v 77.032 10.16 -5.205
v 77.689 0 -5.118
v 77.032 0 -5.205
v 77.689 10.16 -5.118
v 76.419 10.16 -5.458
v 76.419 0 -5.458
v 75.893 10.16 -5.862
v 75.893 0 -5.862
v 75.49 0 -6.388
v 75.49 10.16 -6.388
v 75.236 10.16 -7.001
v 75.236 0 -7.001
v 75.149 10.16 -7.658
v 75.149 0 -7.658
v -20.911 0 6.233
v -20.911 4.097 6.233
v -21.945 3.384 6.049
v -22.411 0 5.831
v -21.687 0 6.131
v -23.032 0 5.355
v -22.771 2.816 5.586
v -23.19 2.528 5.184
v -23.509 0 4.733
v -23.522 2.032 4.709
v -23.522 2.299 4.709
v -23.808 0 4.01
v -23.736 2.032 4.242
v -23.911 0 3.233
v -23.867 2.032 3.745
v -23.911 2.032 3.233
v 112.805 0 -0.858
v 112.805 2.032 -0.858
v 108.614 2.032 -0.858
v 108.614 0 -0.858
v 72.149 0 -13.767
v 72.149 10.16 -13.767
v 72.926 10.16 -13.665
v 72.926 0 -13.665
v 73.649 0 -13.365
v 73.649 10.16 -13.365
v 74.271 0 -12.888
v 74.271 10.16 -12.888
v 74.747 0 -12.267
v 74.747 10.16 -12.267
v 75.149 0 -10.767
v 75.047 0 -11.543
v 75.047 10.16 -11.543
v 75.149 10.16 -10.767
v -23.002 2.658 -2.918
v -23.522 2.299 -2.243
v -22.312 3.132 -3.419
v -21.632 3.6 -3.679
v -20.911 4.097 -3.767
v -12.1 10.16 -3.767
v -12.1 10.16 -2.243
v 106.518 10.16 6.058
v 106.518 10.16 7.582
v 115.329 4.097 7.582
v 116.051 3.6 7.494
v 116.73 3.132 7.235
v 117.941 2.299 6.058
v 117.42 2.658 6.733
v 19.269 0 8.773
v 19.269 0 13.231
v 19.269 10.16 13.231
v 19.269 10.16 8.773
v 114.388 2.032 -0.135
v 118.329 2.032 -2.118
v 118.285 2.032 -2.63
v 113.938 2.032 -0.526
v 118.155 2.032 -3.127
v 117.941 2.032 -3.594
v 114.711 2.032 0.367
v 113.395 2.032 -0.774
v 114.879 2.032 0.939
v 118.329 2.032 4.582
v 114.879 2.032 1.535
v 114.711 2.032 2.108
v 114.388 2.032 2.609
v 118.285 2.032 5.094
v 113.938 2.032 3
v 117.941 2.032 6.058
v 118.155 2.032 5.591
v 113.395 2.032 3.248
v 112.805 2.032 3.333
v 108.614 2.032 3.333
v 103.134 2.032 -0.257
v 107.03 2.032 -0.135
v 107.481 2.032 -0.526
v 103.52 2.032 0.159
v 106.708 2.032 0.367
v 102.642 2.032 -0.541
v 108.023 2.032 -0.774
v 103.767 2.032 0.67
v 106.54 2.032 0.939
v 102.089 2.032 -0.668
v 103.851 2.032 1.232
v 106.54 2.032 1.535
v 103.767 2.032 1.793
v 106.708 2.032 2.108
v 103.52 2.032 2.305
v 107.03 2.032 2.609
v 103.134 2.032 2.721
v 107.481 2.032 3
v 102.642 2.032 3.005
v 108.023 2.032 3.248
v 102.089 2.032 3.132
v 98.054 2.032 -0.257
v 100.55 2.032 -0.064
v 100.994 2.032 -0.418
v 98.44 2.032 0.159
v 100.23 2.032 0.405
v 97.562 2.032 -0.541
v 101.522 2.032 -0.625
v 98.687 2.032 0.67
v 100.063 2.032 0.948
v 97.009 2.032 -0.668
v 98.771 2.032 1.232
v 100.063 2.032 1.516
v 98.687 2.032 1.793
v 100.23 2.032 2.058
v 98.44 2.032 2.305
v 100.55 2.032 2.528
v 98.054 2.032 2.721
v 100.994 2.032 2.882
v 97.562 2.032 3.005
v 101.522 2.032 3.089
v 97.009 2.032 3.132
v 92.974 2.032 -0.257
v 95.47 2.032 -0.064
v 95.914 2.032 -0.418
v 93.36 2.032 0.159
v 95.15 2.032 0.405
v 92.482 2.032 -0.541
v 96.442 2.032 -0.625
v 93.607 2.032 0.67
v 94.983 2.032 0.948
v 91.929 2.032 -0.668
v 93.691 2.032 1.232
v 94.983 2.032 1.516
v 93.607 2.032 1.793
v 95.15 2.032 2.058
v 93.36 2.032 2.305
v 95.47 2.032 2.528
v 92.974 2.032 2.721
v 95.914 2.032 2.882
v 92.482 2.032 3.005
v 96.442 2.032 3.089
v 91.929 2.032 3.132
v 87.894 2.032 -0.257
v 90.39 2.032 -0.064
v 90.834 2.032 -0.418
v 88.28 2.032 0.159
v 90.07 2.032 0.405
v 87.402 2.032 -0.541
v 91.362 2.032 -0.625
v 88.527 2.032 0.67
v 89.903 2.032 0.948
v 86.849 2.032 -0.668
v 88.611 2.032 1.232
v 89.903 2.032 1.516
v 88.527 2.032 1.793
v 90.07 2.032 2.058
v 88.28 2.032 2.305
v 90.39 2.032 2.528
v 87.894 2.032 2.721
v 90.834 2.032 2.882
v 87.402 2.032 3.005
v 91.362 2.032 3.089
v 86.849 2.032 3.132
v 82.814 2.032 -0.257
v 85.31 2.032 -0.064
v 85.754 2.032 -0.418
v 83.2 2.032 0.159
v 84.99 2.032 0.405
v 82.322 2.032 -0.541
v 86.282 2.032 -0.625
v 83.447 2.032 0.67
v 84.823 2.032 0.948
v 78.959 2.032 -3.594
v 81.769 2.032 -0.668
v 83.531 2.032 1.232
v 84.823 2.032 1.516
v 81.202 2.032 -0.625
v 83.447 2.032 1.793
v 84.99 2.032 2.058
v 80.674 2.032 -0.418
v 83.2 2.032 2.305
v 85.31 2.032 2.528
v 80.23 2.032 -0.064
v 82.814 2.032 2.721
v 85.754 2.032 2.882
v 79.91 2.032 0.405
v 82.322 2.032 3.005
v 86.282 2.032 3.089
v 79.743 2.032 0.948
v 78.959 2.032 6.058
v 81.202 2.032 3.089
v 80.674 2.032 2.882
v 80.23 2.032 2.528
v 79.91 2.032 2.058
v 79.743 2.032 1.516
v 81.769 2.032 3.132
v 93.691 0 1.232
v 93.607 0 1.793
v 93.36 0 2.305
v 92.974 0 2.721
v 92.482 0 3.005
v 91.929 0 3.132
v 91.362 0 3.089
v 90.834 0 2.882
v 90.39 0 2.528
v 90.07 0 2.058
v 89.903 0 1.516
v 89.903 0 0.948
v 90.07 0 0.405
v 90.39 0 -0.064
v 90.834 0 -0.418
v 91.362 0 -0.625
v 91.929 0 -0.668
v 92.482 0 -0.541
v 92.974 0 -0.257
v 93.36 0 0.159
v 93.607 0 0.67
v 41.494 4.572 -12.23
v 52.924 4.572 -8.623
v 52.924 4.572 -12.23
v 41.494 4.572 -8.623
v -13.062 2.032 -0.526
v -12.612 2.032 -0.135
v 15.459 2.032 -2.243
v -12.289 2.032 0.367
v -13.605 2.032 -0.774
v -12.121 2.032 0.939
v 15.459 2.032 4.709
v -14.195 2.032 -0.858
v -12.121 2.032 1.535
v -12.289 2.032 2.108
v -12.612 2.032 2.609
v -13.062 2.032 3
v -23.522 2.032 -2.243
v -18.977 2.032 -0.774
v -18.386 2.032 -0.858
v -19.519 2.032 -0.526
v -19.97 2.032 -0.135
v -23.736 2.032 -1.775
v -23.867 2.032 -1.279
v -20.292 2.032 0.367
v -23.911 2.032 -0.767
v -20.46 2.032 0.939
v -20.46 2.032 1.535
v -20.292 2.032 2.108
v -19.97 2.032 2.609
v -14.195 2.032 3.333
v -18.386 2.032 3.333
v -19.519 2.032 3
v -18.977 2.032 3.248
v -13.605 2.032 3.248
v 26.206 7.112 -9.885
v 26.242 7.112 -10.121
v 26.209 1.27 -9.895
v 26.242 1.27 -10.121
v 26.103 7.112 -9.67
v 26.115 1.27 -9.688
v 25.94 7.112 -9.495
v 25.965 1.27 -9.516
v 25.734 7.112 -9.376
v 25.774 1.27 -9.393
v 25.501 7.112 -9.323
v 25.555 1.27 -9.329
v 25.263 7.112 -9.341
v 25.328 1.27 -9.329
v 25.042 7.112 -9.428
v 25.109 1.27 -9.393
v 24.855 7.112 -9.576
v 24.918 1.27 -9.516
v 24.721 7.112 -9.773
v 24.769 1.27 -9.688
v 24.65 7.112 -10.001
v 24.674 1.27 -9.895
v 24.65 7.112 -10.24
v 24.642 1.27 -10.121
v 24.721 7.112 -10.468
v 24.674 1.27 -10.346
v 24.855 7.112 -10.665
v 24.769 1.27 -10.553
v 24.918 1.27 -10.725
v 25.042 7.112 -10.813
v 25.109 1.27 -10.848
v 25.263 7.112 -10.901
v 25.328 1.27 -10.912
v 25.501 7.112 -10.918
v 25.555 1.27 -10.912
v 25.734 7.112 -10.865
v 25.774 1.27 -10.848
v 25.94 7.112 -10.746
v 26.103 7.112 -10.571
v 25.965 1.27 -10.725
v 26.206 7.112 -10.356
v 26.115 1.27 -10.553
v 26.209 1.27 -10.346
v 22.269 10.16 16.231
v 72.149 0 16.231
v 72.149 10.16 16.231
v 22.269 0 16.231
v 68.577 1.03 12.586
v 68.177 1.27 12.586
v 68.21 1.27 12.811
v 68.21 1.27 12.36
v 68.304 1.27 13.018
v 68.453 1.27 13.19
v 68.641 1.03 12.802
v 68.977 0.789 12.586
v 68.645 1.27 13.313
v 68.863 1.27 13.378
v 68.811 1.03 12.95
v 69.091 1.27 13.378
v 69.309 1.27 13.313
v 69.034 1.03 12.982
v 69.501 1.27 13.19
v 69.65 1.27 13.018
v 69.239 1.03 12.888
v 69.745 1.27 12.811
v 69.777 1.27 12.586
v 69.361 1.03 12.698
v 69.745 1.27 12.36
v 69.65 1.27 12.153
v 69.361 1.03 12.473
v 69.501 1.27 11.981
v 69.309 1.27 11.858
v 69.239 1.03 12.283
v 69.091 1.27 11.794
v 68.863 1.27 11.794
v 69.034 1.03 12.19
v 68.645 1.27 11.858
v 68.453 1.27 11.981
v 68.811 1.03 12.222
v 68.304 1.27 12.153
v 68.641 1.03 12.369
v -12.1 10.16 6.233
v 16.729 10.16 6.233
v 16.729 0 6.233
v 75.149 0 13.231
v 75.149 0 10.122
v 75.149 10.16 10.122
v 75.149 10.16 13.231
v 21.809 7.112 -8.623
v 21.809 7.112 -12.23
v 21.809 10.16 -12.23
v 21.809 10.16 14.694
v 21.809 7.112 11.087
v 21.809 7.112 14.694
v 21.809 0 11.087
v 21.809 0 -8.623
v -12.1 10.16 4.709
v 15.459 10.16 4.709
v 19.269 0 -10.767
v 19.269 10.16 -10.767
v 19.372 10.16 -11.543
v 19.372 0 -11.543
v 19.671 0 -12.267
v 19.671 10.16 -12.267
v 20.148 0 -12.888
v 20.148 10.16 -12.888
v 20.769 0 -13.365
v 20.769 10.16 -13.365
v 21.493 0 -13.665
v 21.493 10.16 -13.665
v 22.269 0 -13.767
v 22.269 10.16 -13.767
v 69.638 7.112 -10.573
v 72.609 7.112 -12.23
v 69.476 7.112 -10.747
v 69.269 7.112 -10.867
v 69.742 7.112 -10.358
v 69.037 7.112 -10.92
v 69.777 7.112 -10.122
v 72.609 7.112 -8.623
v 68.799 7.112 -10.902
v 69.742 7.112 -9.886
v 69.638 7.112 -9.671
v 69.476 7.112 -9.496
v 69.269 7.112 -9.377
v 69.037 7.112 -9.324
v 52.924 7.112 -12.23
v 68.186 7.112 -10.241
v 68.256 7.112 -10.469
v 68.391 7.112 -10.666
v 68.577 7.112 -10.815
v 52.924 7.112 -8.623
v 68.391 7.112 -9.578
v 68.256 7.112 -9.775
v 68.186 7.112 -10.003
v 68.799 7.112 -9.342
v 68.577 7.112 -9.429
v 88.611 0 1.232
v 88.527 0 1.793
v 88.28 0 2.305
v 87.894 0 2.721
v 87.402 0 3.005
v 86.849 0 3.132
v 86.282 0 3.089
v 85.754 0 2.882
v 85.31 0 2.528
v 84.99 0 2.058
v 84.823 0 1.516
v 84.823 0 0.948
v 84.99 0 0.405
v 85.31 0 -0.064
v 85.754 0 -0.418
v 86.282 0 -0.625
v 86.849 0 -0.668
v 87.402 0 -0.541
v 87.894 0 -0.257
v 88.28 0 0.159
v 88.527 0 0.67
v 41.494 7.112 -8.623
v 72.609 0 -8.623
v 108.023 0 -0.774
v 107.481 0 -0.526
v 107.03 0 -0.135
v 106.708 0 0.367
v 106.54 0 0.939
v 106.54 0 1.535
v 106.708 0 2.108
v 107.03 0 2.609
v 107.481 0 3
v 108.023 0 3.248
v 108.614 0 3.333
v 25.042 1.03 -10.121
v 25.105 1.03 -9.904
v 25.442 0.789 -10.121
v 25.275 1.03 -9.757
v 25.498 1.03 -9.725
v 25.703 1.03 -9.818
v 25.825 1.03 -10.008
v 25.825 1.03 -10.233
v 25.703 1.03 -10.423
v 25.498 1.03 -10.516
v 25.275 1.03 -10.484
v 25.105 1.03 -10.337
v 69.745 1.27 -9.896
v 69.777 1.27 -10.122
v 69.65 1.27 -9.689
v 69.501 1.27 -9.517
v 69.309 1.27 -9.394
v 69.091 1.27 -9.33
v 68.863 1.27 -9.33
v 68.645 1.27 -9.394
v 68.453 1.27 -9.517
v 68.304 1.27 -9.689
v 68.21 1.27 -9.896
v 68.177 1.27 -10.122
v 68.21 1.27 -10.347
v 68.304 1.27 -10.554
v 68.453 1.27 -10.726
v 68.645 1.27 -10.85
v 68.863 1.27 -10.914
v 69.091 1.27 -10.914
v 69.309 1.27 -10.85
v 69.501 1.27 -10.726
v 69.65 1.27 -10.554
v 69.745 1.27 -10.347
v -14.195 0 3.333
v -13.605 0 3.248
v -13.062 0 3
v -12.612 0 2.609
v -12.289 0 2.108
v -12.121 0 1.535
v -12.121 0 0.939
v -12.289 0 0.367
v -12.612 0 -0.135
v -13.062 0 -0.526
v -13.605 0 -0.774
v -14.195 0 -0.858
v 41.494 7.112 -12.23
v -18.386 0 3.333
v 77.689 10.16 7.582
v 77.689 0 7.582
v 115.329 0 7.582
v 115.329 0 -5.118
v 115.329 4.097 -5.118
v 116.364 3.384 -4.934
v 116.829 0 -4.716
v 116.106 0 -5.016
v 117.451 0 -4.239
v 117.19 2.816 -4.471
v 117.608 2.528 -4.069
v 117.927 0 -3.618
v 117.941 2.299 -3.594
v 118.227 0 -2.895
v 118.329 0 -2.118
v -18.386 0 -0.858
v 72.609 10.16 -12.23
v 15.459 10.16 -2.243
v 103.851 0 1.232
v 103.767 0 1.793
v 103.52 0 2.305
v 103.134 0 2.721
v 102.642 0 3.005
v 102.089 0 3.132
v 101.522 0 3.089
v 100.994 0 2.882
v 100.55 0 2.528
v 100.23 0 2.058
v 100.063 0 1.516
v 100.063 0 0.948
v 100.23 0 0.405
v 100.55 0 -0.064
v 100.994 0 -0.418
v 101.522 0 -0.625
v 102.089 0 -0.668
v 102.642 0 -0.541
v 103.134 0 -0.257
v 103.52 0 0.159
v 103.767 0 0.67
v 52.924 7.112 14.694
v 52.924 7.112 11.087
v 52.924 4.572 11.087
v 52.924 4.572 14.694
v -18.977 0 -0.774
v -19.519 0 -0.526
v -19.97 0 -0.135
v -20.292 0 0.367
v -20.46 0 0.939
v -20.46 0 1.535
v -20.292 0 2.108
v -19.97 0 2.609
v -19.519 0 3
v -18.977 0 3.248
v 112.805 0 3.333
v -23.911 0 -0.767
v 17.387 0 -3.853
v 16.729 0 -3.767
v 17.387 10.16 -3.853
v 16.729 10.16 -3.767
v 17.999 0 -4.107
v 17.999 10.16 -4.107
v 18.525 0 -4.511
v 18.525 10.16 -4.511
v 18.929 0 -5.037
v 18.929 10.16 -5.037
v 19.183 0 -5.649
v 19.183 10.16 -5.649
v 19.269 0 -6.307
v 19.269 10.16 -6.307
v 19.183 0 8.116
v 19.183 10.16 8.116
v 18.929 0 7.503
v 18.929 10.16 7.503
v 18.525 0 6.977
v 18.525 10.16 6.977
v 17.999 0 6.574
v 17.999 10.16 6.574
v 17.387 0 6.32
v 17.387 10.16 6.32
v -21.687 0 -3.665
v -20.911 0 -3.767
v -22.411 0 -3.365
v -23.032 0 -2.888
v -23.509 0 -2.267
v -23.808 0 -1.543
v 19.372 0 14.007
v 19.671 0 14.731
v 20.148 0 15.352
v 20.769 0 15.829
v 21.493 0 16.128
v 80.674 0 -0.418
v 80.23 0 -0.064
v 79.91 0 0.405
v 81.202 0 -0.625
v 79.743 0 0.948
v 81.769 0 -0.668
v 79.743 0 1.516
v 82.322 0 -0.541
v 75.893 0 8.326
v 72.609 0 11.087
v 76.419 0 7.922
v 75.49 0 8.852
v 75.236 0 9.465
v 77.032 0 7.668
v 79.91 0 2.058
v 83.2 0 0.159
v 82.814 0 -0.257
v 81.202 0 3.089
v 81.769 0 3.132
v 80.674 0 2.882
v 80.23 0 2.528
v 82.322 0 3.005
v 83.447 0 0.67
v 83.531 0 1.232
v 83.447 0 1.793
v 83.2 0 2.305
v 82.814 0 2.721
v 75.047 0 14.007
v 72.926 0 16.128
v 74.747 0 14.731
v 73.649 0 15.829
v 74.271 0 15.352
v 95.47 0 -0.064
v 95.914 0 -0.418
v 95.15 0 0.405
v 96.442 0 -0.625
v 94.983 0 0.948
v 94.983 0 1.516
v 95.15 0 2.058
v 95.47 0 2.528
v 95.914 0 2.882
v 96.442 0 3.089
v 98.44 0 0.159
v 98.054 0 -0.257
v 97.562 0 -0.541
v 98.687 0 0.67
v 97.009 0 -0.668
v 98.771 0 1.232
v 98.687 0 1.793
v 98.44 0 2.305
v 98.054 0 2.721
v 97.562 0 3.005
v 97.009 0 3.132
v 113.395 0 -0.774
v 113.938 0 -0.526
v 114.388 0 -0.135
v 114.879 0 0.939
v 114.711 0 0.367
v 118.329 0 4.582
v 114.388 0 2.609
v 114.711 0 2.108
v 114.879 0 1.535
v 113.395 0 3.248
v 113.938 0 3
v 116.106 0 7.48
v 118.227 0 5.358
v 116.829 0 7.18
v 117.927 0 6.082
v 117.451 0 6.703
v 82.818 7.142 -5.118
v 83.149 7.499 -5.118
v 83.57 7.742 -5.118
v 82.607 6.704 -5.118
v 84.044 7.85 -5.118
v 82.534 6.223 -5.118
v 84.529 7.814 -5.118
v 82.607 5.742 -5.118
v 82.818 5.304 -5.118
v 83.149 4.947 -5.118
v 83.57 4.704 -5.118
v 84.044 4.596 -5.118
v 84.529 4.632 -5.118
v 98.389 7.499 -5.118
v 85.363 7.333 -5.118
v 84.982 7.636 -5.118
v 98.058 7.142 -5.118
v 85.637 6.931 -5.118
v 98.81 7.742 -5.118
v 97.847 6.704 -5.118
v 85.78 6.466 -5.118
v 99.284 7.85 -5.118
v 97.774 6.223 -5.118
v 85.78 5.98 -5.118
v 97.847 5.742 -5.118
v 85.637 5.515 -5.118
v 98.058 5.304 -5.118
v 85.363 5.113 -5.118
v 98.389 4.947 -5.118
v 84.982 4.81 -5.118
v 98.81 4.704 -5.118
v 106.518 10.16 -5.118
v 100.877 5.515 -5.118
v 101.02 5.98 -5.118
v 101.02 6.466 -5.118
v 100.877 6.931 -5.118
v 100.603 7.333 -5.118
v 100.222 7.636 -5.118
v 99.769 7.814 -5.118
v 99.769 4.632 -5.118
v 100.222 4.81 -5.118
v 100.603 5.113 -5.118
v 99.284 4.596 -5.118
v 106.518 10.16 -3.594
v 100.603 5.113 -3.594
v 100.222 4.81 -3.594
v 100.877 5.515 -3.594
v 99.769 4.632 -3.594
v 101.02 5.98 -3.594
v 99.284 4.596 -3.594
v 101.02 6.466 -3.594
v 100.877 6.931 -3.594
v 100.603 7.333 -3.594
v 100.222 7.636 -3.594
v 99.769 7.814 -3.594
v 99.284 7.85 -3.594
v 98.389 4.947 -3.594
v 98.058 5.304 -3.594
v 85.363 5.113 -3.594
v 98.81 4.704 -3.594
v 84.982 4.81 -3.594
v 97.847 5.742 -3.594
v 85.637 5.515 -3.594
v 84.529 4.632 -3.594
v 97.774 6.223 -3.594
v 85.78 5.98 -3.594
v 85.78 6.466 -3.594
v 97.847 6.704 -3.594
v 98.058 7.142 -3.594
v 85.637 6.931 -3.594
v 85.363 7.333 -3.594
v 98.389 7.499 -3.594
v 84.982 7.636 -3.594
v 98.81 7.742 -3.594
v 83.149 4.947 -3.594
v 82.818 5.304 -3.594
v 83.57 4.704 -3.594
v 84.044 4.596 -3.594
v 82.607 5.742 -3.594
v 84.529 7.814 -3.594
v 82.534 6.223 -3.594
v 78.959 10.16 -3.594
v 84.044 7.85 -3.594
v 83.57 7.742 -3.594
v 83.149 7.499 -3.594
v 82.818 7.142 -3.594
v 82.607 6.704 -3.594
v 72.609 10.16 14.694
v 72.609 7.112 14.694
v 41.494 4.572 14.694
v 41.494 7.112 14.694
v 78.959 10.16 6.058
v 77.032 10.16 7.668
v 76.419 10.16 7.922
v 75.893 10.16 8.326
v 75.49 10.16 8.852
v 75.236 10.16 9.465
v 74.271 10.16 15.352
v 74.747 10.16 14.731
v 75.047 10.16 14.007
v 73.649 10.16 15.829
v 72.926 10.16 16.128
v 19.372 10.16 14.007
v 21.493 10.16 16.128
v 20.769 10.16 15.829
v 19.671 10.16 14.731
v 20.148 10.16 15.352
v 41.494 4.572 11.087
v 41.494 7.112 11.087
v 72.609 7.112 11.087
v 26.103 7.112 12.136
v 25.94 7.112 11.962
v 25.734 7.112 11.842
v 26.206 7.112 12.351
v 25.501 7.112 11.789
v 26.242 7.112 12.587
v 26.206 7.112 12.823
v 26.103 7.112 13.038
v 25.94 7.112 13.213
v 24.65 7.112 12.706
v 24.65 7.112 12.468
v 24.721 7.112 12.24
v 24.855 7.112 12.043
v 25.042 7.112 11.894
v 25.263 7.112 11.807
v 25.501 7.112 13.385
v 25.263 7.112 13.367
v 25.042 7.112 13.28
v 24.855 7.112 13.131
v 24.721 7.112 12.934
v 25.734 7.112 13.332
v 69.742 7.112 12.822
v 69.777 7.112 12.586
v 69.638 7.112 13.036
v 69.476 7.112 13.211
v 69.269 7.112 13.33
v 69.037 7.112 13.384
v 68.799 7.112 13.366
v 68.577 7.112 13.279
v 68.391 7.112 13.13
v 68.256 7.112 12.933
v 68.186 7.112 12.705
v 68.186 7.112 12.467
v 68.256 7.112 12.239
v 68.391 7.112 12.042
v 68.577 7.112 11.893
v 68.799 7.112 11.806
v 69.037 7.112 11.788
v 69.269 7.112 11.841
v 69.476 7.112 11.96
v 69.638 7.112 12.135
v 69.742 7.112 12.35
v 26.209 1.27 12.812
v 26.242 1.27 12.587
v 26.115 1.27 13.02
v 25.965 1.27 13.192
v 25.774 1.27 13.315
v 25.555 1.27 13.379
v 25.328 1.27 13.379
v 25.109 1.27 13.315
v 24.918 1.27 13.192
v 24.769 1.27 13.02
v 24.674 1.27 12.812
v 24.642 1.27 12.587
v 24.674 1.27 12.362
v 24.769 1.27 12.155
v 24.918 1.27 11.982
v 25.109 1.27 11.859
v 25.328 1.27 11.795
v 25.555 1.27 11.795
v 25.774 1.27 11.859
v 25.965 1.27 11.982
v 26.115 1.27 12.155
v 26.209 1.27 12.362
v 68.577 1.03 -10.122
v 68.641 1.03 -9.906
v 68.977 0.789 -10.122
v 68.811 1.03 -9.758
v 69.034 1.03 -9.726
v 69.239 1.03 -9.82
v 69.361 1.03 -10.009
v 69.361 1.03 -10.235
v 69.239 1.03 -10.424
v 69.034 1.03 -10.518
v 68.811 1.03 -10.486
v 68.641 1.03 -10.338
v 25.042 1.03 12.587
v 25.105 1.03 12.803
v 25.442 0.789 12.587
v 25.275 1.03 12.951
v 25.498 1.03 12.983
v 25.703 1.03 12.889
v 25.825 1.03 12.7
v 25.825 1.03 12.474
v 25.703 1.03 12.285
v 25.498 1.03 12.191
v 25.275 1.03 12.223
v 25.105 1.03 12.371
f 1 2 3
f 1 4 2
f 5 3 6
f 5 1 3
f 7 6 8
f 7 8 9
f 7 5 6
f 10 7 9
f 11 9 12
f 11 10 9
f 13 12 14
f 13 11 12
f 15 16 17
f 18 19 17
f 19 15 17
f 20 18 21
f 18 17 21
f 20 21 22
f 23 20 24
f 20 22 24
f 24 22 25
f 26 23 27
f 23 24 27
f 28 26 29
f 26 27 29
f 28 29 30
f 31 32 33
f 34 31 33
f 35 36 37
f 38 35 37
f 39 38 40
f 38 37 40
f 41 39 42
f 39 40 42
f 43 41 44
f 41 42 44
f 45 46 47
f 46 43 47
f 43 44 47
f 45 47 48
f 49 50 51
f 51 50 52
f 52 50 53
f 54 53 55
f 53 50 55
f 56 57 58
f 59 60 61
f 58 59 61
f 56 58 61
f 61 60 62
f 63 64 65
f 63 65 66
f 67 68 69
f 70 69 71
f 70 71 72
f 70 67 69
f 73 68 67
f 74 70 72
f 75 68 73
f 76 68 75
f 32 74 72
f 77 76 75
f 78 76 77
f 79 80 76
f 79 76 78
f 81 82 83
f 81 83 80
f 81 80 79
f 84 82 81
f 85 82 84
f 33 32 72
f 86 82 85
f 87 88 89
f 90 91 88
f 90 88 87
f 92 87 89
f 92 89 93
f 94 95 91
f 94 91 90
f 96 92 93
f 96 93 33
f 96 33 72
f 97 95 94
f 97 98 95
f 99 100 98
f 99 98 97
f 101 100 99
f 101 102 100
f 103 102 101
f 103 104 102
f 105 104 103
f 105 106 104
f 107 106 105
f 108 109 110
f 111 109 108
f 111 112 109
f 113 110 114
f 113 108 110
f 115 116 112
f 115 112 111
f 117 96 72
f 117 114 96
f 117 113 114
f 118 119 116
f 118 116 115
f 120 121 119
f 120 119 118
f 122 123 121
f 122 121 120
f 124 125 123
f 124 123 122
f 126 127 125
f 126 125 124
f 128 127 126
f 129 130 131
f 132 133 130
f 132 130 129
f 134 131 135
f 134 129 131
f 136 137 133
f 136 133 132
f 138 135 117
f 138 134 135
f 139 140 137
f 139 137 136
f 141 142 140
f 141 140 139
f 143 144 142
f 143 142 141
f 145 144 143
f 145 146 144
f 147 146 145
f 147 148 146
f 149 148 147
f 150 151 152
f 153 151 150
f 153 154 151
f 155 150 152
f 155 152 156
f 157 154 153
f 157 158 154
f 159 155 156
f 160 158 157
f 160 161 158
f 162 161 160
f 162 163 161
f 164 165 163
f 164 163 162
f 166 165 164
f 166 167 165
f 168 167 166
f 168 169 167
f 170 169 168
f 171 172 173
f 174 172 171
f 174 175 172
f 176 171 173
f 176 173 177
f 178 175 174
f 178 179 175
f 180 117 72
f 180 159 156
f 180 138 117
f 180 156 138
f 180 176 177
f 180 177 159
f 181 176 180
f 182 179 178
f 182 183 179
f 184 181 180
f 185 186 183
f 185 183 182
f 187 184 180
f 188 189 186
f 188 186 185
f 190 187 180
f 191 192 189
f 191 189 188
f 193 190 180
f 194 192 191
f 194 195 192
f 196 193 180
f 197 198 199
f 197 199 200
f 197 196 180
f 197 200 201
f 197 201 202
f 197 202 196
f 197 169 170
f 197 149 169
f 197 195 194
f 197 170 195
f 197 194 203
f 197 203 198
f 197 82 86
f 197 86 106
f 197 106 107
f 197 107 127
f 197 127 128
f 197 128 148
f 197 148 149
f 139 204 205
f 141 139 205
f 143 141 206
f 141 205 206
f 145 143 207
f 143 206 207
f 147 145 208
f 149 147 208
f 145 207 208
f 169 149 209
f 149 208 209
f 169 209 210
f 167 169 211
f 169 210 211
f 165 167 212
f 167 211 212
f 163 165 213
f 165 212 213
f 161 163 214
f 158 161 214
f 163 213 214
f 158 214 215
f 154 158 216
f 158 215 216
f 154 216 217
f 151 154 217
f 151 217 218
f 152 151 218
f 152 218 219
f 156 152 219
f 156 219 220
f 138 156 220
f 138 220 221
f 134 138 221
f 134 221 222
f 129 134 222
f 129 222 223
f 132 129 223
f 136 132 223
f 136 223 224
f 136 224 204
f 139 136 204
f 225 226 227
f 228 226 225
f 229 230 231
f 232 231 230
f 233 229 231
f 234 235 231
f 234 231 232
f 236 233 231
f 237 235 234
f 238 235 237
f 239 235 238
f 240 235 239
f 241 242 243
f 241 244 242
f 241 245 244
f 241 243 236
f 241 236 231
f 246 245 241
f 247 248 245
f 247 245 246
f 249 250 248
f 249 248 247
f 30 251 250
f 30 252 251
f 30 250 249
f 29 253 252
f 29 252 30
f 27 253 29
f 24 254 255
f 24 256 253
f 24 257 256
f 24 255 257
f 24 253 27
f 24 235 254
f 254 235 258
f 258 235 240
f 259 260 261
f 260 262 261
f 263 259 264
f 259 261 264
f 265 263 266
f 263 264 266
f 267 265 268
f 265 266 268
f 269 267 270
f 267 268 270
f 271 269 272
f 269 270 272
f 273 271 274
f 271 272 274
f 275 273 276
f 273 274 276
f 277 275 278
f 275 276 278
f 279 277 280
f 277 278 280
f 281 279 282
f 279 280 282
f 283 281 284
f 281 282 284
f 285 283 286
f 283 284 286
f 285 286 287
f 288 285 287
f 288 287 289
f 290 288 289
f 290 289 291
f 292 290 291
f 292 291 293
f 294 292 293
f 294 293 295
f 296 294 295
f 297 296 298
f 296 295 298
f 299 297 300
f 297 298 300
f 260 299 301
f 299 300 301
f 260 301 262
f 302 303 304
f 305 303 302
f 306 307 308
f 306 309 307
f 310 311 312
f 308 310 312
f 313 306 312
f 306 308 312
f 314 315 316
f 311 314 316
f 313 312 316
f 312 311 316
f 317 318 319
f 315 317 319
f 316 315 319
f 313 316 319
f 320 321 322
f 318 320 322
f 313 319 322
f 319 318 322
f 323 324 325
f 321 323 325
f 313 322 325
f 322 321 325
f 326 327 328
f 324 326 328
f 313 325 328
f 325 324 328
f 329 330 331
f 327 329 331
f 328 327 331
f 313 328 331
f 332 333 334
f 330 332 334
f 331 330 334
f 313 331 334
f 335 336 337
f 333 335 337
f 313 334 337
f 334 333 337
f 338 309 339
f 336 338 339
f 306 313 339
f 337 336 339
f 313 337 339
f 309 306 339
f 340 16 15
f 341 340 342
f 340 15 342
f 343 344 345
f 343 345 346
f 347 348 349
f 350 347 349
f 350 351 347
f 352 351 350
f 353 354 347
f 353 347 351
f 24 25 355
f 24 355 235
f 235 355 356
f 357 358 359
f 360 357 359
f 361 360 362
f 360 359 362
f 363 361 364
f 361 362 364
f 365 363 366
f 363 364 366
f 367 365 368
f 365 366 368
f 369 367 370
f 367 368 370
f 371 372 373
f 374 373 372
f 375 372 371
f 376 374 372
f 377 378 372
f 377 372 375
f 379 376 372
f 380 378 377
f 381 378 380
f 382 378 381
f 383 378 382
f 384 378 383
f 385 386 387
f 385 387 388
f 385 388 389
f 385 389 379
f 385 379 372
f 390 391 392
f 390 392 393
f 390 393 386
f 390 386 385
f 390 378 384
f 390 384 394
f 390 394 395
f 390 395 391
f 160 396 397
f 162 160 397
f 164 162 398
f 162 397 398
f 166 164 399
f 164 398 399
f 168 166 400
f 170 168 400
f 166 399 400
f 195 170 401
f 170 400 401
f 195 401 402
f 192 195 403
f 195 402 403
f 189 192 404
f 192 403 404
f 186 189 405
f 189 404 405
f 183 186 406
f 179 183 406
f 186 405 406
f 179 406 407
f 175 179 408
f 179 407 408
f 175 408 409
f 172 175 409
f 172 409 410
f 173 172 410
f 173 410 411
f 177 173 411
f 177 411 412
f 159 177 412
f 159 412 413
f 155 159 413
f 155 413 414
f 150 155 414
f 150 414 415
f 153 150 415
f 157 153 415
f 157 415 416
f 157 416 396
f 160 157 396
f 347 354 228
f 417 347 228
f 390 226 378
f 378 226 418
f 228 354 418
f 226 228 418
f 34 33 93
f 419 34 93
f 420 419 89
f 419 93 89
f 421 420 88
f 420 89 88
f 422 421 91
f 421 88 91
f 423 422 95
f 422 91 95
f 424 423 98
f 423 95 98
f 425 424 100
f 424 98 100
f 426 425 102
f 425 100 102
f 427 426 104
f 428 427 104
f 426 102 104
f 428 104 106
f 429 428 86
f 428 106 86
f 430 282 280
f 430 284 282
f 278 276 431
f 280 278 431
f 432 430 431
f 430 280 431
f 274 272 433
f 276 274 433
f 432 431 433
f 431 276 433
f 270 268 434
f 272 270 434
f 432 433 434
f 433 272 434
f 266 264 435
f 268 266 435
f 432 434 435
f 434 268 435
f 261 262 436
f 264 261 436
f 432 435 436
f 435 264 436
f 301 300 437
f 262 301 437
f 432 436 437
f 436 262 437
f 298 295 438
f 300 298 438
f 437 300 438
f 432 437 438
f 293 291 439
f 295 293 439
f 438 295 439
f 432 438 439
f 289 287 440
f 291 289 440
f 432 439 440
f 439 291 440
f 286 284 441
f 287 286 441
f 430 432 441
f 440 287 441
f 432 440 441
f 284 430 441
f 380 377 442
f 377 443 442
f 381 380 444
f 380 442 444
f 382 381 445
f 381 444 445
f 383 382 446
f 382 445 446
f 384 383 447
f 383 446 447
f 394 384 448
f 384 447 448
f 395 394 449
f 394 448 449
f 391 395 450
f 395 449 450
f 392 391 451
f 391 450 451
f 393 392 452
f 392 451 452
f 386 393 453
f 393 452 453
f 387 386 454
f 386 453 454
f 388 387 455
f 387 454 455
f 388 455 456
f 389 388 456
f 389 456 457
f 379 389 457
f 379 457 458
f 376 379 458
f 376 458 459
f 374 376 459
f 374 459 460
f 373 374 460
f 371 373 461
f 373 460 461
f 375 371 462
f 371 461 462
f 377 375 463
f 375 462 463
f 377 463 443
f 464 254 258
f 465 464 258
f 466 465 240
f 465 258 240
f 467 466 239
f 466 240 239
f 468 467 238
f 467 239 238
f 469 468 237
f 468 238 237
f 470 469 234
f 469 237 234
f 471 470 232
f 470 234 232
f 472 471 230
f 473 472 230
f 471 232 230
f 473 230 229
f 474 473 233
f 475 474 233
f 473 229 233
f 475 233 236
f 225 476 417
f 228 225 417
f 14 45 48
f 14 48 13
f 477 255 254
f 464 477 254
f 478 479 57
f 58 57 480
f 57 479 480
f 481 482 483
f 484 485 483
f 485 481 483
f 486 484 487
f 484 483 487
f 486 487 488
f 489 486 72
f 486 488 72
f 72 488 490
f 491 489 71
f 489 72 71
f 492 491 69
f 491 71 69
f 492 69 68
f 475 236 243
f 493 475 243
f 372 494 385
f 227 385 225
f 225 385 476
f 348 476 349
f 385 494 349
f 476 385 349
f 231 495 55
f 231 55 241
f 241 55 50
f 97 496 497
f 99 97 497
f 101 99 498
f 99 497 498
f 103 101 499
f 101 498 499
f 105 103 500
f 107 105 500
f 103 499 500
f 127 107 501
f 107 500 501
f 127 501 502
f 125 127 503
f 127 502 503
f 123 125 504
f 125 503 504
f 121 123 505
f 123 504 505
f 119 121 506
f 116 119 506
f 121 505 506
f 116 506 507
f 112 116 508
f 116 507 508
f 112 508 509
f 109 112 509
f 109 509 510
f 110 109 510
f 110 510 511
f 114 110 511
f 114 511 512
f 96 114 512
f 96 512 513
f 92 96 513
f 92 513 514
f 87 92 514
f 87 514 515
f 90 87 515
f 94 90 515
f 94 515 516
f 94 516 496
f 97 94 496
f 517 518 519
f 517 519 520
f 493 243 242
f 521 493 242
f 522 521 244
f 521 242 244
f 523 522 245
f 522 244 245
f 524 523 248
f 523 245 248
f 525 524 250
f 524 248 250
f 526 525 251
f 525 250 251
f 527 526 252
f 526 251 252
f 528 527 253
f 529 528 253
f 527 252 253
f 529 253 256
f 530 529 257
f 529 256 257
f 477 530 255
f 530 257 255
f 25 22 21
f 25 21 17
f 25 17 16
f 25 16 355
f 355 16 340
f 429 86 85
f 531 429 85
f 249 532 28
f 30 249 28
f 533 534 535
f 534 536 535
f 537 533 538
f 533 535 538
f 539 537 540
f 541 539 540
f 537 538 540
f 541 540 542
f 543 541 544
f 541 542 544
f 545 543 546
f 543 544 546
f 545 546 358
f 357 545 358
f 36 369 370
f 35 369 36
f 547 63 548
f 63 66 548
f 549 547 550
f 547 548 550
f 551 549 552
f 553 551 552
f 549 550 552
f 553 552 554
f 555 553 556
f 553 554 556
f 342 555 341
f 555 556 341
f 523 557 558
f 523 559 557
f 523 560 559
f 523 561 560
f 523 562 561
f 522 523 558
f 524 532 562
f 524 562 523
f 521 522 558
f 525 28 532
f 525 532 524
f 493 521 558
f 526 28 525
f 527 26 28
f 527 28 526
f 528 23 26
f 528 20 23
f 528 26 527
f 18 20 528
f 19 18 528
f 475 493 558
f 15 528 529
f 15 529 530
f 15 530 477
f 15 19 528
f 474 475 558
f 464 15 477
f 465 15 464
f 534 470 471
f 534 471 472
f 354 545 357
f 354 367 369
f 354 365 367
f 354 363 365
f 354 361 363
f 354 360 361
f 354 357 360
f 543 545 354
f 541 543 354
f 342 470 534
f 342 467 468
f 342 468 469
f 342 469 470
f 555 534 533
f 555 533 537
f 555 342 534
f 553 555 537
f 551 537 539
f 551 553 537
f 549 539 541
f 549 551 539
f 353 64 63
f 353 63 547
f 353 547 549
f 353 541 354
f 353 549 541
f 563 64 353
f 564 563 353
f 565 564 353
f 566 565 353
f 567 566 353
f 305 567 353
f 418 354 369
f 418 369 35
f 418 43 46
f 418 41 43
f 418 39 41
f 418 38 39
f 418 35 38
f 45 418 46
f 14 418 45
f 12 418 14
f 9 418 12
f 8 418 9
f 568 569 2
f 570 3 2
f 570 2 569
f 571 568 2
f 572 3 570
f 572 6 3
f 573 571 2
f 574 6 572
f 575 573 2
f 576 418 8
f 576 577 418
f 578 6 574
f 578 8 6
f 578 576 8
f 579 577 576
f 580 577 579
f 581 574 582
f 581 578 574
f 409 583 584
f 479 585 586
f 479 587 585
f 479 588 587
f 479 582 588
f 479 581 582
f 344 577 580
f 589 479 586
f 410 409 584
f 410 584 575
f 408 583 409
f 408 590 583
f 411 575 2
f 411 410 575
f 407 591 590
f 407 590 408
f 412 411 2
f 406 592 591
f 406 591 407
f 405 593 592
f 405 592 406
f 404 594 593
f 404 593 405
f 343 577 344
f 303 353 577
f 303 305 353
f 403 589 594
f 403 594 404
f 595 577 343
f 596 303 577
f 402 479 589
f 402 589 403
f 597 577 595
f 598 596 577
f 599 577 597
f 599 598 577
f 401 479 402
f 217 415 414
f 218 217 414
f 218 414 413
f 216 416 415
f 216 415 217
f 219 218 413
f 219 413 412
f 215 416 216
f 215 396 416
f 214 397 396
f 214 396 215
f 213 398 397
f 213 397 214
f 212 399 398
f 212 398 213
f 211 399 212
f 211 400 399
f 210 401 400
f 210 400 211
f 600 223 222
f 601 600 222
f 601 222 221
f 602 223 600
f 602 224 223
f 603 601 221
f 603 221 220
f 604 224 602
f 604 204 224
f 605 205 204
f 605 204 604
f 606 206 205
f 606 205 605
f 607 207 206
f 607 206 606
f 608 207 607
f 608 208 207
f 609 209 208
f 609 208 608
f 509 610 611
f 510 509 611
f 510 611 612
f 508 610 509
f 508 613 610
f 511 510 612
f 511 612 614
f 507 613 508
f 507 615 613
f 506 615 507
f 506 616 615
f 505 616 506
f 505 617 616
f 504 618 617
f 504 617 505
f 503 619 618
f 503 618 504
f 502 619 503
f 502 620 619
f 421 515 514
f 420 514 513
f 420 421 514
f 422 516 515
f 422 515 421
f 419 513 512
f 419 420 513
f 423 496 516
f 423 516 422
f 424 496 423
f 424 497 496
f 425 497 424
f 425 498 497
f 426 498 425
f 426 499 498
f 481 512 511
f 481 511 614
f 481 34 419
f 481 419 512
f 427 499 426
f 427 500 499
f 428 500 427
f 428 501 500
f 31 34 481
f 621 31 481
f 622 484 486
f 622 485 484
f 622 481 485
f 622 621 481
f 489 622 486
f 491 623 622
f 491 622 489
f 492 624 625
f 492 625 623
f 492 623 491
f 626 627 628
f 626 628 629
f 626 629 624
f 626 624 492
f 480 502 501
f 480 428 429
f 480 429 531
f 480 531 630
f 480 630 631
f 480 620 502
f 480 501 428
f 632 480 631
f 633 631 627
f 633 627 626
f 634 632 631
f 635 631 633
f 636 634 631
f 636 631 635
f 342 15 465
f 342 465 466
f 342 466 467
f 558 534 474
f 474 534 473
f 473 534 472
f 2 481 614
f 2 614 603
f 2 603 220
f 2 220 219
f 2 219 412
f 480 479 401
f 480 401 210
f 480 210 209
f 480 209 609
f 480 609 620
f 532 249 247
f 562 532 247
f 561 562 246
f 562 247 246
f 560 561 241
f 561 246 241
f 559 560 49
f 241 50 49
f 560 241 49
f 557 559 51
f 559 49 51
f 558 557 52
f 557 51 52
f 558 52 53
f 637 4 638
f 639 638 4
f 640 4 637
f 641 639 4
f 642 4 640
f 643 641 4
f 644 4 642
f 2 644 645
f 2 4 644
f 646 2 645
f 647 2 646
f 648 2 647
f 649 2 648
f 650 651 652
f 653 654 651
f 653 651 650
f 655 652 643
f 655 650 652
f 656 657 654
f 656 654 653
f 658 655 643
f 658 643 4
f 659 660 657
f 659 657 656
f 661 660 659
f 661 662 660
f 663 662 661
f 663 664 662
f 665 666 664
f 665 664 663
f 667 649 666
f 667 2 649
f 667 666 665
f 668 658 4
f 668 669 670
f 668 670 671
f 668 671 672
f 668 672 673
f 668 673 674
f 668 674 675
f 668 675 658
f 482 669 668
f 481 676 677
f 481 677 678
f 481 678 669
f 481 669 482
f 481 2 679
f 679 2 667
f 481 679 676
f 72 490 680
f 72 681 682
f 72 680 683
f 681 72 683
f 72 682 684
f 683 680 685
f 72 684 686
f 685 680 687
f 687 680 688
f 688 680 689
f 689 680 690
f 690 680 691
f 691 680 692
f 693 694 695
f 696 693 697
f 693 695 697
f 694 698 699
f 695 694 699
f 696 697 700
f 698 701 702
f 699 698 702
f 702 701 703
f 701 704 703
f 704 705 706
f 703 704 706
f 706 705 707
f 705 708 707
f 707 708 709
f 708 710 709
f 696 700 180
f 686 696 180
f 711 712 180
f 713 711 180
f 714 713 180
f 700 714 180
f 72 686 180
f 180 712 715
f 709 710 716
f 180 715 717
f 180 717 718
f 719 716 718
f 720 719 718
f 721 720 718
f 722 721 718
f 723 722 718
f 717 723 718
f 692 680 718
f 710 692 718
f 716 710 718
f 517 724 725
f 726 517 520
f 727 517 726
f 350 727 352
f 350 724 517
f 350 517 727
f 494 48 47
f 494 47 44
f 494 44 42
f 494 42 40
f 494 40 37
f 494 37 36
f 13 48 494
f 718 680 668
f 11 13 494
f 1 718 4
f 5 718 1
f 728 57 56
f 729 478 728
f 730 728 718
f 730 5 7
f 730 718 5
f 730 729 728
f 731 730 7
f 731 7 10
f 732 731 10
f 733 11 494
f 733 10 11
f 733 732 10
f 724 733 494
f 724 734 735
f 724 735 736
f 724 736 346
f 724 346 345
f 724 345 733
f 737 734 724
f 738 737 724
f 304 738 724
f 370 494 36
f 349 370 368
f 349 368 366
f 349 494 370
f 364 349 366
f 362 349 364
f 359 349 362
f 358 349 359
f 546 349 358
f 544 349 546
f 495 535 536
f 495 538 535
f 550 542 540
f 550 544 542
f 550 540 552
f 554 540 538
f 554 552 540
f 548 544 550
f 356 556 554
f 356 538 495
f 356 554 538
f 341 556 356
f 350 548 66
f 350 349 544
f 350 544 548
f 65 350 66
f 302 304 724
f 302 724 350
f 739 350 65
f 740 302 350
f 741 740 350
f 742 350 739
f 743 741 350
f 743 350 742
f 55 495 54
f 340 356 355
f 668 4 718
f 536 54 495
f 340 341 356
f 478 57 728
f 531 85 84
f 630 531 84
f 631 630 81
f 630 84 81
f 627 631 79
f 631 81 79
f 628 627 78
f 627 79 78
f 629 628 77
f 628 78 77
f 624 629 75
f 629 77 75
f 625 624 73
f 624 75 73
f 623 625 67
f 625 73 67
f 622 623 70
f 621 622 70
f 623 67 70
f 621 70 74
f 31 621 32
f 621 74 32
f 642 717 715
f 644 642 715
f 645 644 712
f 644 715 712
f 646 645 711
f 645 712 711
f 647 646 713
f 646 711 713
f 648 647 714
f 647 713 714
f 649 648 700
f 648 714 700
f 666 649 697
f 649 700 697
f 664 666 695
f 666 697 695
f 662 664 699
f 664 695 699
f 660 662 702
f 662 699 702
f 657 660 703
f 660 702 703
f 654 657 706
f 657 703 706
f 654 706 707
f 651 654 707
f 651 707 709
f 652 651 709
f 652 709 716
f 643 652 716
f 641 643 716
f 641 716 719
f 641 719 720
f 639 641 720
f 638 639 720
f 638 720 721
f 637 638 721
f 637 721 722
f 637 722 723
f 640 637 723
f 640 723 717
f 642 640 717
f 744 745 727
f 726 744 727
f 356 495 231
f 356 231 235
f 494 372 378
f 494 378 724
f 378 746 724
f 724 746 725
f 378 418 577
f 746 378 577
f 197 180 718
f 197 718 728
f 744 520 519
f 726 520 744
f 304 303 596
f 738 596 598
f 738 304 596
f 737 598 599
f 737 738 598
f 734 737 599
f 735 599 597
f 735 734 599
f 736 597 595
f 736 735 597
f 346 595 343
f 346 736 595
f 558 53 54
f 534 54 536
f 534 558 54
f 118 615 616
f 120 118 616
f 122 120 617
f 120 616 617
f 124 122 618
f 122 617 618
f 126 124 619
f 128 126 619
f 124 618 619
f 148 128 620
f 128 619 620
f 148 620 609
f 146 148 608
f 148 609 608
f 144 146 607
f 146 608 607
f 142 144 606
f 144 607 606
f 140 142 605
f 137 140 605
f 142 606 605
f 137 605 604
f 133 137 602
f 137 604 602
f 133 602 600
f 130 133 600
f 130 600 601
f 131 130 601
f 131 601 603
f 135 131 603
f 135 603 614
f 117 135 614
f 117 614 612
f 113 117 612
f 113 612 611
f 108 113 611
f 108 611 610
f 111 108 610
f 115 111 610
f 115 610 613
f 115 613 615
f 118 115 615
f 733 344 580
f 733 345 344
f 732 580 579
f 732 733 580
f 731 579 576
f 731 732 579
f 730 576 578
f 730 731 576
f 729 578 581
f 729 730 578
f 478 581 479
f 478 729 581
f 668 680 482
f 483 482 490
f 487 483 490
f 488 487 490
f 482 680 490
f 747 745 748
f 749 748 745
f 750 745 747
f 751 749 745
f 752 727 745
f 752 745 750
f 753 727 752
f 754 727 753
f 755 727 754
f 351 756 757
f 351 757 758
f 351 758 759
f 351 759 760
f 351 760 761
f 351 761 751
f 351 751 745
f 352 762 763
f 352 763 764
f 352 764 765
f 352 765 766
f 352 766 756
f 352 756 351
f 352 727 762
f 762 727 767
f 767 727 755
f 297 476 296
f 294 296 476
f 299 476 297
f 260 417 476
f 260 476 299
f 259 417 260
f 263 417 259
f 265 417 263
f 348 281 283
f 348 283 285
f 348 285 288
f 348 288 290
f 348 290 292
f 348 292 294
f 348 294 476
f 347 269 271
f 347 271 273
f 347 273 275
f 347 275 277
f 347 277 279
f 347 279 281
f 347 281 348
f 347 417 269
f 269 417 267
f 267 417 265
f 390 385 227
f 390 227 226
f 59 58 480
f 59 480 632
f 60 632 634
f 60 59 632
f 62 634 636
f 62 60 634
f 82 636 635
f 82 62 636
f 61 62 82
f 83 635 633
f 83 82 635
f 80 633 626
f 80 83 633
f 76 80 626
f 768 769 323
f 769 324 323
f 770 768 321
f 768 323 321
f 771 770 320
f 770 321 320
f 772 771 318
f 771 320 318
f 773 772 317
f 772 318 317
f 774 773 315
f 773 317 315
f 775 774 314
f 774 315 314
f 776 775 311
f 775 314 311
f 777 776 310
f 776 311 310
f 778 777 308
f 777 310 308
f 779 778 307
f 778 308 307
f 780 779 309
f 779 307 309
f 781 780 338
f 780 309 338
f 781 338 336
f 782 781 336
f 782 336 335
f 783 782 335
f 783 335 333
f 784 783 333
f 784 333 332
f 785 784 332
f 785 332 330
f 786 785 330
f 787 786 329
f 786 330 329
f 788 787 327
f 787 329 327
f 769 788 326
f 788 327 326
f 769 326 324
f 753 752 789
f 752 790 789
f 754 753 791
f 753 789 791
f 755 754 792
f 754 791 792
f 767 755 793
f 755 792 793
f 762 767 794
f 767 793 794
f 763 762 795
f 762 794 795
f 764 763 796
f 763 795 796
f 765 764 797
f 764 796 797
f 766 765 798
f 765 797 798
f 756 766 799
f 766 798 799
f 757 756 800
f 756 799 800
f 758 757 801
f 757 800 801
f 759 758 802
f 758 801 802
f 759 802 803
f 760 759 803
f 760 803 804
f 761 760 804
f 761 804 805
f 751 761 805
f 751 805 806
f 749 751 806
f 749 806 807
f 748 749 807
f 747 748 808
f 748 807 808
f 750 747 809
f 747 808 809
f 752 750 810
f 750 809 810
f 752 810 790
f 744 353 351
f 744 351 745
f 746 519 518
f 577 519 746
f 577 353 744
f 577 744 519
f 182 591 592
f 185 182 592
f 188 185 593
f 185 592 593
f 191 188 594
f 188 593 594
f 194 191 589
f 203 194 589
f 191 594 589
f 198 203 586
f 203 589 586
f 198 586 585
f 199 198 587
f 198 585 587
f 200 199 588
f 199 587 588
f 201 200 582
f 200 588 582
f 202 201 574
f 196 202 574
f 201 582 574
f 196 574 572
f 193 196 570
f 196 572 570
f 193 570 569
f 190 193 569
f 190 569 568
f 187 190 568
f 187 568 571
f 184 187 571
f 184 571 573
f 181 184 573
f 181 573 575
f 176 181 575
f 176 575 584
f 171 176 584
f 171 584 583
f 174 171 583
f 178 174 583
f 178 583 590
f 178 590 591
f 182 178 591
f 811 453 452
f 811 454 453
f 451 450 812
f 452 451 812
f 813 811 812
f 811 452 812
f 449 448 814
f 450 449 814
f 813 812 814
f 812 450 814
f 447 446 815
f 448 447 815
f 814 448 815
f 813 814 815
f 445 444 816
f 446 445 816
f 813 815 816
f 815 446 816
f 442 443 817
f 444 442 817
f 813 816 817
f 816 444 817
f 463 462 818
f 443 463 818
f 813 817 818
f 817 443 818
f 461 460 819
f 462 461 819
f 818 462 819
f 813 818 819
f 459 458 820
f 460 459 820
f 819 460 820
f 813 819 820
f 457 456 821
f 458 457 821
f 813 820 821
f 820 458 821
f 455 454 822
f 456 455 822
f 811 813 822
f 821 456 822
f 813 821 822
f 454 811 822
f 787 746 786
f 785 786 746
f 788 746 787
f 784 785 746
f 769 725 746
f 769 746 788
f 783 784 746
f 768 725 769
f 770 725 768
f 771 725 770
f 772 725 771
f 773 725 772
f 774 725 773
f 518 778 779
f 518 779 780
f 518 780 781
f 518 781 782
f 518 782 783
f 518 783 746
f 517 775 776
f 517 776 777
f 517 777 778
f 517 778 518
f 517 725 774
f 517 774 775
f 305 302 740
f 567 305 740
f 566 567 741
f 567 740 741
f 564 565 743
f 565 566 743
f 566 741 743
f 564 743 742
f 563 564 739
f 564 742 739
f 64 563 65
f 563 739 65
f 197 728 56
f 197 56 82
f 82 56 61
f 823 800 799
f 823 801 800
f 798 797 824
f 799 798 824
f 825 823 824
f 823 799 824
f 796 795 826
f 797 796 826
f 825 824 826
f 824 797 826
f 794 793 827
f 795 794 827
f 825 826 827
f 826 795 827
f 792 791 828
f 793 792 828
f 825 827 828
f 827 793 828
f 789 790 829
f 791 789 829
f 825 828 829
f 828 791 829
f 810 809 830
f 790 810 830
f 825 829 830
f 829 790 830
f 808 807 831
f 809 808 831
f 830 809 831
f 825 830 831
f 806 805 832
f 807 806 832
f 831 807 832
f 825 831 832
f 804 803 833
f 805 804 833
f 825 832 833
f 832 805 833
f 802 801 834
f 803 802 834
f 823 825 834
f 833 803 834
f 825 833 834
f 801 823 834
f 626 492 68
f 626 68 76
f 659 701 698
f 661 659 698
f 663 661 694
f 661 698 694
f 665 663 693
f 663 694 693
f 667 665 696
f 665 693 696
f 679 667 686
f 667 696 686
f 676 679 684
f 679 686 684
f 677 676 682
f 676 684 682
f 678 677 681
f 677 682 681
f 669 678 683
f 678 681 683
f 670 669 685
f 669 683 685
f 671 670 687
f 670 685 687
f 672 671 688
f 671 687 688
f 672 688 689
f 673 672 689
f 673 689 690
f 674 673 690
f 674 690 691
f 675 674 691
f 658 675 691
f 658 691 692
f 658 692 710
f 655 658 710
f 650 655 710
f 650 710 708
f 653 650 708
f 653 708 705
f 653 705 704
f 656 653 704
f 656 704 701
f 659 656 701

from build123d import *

# Parameters (mm, degrees)
F0_W         = 50.8
F0_H         = 19.7104
F0_W_2       = 43.18
F0_H_2       = 10
F0_H_3       = 12.7
F1_DEPTH     = 10.16
F2_W         = 50.8
F2_H         = 3.6068
F2_H_2       = 19.7104
F3_DEPTH     = 3.048
F4_W         = 45.72
F4_H         = 9.652
F4_W_2       = 2.54
F4_H_2       = 6.952
F4_W_3       = 12.7
F5_DEPTH     = 8.128
F8_DEPTH     = 25
F10_T1_DEPTH = 25.16
F10_T3_DEPTH = 17.032
F12_D        = 1.6
F12_DEPTH    = 5.842
F12_TIP      = 0.4806884952
F13_W        = 5.715
F13_H        = 3.6068
F14_DEPTH    = 2.54
F15_W        = 5.715
F15_H        = 3.6068
F16_DEPTH    = 2.54
F17_DEPTH    = 25.4
F18_R        = 2.54
F20_D        = 3.81
F21_W        = 6.35
F21_H        = 9.652
F22_W        = 6.35
F22_H        = 6.952
F23_DEPTH    = 8.128
F25_D        = 3.2639
F25_DEPTH    = 8.255
F25_TIP      = 0.9805744872


# Not quite as in the source:
# - a fillet or chamfer that OpenCascade refuses, or shapes differently, is made with other operations: its cross-section is extruded or revolved along the edge and cut away or added


with BuildPart() as f1:
    # F0 (on Front) → F1 (new body)
    with BuildSketch(Plane.XZ):
        Polygon((75.1493134361, 16.2306381539), (19.2693134361, 16.2306381539), (19.2693134361, 6.2332381539), (19.2693134361, -3.7667618461), (19.2693134361, -13.7667618461), (75.1493134361, -13.7667618461), (75.1493134361, -5.1180618461), (75.1493134361, 7.5819381539), align=None)
        with Locations((47.2093134361, 1.2319381539)):
            Rectangle(F0_W, F0_H, mode=Mode.SUBTRACT)
        with Locations((-2.3206865639, 1.2332381539)):
            Rectangle(F0_W_2, F0_H_2)
        with Locations((96.7393134361, 1.2319381539)):
            Rectangle(F0_W_2, F0_H_3)
    extrude(amount=-F1_DEPTH)

    # F2 (on face) → F3 (cut)
    with BuildSketch(Plane(origin=(0, 10.16, 0), x_dir=(-1, 0, 0), z_dir=(0, 1, 0))):
        with Locations((-47.2093134361, -10.4266618461)):
            Rectangle(F2_W, F2_H)
        with Locations((-47.2093134361, 1.2319381539)):
            Rectangle(F2_W, F2_H_2)
        with Locations((-47.2093134361, 12.8905381539)):
            Rectangle(F2_W, F2_H)
    extrude(amount=-F3_DEPTH, mode=Mode.SUBTRACT)

    # F4 (on face) → F5 (cut)
    with BuildSketch(Plane(origin=(0, 10.16, 0), x_dir=(-1, 0, 0), z_dir=(0, 1, 0))):
        with Locations((-95.4693134361, 1.2319381539)):
            Rectangle(F4_W, F4_H)
        with Locations((-71.3393134361, 1.2319381539)):
            Rectangle(F4_W_2, F4_H)
        with Locations((-23.0793134361, 1.2332381539)):
            Rectangle(F4_W_2, F4_H_2)
        with Locations((1.0506865639, 1.2332381539)):
            Rectangle(F4_W, F4_H_2)
        with Locations((30.2606865639, 1.2332381539)):
            Rectangle(F4_W_3, F4_H_2)
    extrude(amount=-F5_DEPTH, mode=Mode.SUBTRACT)

    # F7 (on face) + F6 (on face) → F8 (cut)
    with BuildSketch(Plane.XY.offset(6.2332381539)):
        Polygon((-23.9106865639, 10.16), (-23.9106865639, 2.032), (-12.0996865639, 10.16), align=None)
    with BuildSketch(Plane.XY.offset(7.5819381539)):
        Polygon((118.3293134361, 10.16), (106.5183134361, 10.16), (118.3293134361, 2.032), align=None)
    extrude(amount=-F8_DEPTH, mode=Mode.SUBTRACT)

    # F10: fillet of radius 3 on 8 edges, made by hand

    # F10_s2 → F10_t1 (cut)
    with BuildSketch(Plane.XZ.offset(-17.66)):
        with BuildLine():
            ThreePointArc((72.1493134361, -13.7667618461), (74.2706337797, -12.8880821896), (75.1493134361, -10.7667618461))
            Line((75.1493134361, -10.7667618461), (75.1493134361, -13.7667618461))
            Line((75.1493134361, -13.7667618461), (72.1493134361, -13.7667618461))
        make_face()
        with BuildLine():
            ThreePointArc((19.2693134361, -10.7667618461), (20.1479930925, -12.8880821896), (22.2693134361, -13.7667618461))
            Line((22.2693134361, -13.7667618461), (19.2693134361, -13.7667618461))
            Line((19.2693134361, -13.7667618461), (19.2693134361, -10.7667618461))
        make_face()
        with BuildLine():
            ThreePointArc((22.2693134361, 16.2306381539), (20.1479930925, 15.3519584975), (19.2693134361, 13.2306381539))
            Line((19.2693134361, 13.2306381539), (19.2693134361, 16.2306381539))
            Line((19.2693134361, 16.2306381539), (22.2693134361, 16.2306381539))
        make_face()
        with BuildLine():
            ThreePointArc((72.1493134361, 16.2306381539), (74.2706337797, 15.3519584975), (75.1493134361, 13.2306381539))
            Line((75.1493134361, 13.2306381539), (75.1493134361, 16.2306381539))
            Line((75.1493134361, 16.2306381539), (72.1493134361, 16.2306381539))
        make_face()
    extrude(amount=F10_T1_DEPTH, mode=Mode.SUBTRACT)

    # F10_s4 → F10_t3 (cut)
    with BuildSketch(Plane.XZ.offset(-9.532)):
        with BuildLine():
            ThreePointArc((-23.9106865639, -0.7667618461), (-23.0320069075, -2.8880821896), (-20.9106865639, -3.7667618461))
            Line((-20.9106865639, -3.7667618461), (-23.9106865639, -3.7667618461))
            Line((-23.9106865639, -3.7667618461), (-23.9106865639, -0.7667618461))
        make_face()
        with BuildLine():
            ThreePointArc((-20.9106865639, 6.2332381539), (-23.0320069075, 5.3545584975), (-23.9106865639, 3.2332381539))
            Line((-23.9106865639, 3.2332381539), (-23.9106865639, 6.2332381539))
            Line((-23.9106865639, 6.2332381539), (-20.9106865639, 6.2332381539))
        make_face()
        with BuildLine():
            ThreePointArc((115.3293134361, -5.1180618461), (117.4506337797, -4.2393821896), (118.3293134361, -2.1180618461))
            Line((118.3293134361, -2.1180618461), (118.3293134361, -5.1180618461))
            Line((118.3293134361, -5.1180618461), (115.3293134361, -5.1180618461))
        make_face()
        with BuildLine():
            ThreePointArc((115.3293134361, 7.5819381539), (117.4506337797, 6.7032584975), (118.3293134361, 4.5819381539))
            Line((118.3293134361, 4.5819381539), (118.3293134361, 7.5819381539))
            Line((118.3293134361, 7.5819381539), (115.3293134361, 7.5819381539))
        make_face()
    extrude(amount=F10_T3_DEPTH, mode=Mode.SUBTRACT)

    # F12
    with Locations(Plane(origin=(0, 7.112, 0), x_dir=(-1, 0, 0), z_dir=(0, 1, 0))):
        with Locations((-68.9771134361, 12.5857381539), (-25.4415134361, 12.5870381539), (-25.4415134361, -10.1205618461), (-68.9771134361, -10.1218618461)):
            Hole(F12_D / 2, depth=F12_DEPTH)
            with Locations((0, 0, -(F12_DEPTH + F12_TIP / 2))):  # 118° drill point
                Cone(0, F12_D / 2, F12_TIP, mode=Mode.SUBTRACT)

    # F13 (on face) → F14 (cut)
    with BuildSketch(Plane(origin=(0, 7.112, 0), x_dir=(-1, 0, 0), z_dir=(0, 1, 0))):
        with Locations((-50.0668134361, 12.8905381539)):
            Rectangle(F13_W, F13_H)
        with Locations((-44.3518134361, 12.8905381539)):
            Rectangle(F13_W, F13_H)
    extrude(amount=-F14_DEPTH, mode=Mode.SUBTRACT)

    # F15 (on face) → F16 (cut)
    with BuildSketch(Plane(origin=(0, 7.112, 0), x_dir=(-1, 0, 0), z_dir=(0, 1, 0))):
        with Locations((-50.0668134361, -10.4266618461)):
            Rectangle(F15_W, F15_H)
        with Locations((-44.3518134361, -10.4266618461)):
            Rectangle(F15_W, F15_H)
    extrude(amount=-F16_DEPTH, mode=Mode.SUBTRACT)

    # F9 (on face) → F17 (cut)
    with BuildSketch(Plane(origin=(0, 2.032, 0), x_dir=(-1, 0, 0), z_dir=(0, 1, 0))):
        with BuildLine():
            Line((-112.8048134361, -0.8584618461), (-108.6138134361, -0.8584618461))
            ThreePointArc((-108.6138134361, -0.8584618461), (-106.5183134361, 1.2370381539), (-108.6138134361, 3.3325381539))
            Line((-108.6138134361, 3.3325381539), (-112.8048134361, 3.3325381539))
            ThreePointArc((-112.8048134361, 3.3325381539), (-114.9003134361, 1.2370381539), (-112.8048134361, -0.8584618461))
        make_face()
        with BuildLine():
            Line((18.3861865639, 3.3325381428), (14.1951865639, 3.3325381428))
            ThreePointArc((14.1951865639, 3.3325381428), (12.0996865639, 1.2370381428), (14.1951865639, -0.8584618572))
            Line((14.1951865639, -0.8584618572), (18.3861865639, -0.8584618572))
            ThreePointArc((18.3861865639, -0.8584618572), (20.4816865639, 1.2370381428), (18.3861865639, 3.3325381428))
        make_face()
    extrude(amount=-F17_DEPTH, mode=Mode.SUBTRACT)

    # F18
    f18_edges = [f1.edges().sort_by_distance(p)[0] for p in [
        (75.149313, 5.08, 7.581938),
        (75.149313, 5.08, -5.118062),
        (19.269313, 5.08, 6.233238),
        (19.269313, 5.08, -3.766762),
    ]]
    fillet(f18_edges, radius=F18_R)

    # F20 (through all)
    with Locations(Plane(origin=(0, 2.032, 0), x_dir=(-1, 0, 0), z_dir=(0, 1, 0))):
        with Locations((-101.9463134361, 1.2319381539), (-91.7863134361, 1.2319381539), (-81.6263134361, 1.2319381539), (-86.7063134361, 1.2319381539), (-96.8663134361, 1.2319381539)):
            Hole(F20_D / 2)

    # F21 (on face) + F22 (on face) → F23 (join)
    with BuildSketch(Plane(origin=(0, 2.032, 0), x_dir=(-1, 0, 0), z_dir=(0, 1, 0))):
        with Locations((-75.7843134361, 1.2319381539)):
            Rectangle(F21_W, F21_H)
    with BuildSketch(Plane(origin=(0, 2.032, 0), x_dir=(-1, 0, 0), z_dir=(0, 1, 0))):
        with Locations((-18.6343134361, 1.2332381539)):
            Rectangle(F22_W, F22_H)
    extrude(amount=F23_DEPTH)

    # F25
    with Locations(Plane(origin=(0, 0, -5.1180618461), x_dir=(1, 0, 0), z_dir=(0, 0, -1))):
        with Locations((84.1663134361, -6.223), (99.4063134361, -6.223)):
            Hole(F25_D / 2, depth=F25_DEPTH)
            with Locations((0, 0, -(F25_DEPTH + F25_TIP / 2))):  # 118° drill point
                Cone(0, F25_D / 2, F25_TIP, mode=Mode.SUBTRACT)


solid = f1.part
